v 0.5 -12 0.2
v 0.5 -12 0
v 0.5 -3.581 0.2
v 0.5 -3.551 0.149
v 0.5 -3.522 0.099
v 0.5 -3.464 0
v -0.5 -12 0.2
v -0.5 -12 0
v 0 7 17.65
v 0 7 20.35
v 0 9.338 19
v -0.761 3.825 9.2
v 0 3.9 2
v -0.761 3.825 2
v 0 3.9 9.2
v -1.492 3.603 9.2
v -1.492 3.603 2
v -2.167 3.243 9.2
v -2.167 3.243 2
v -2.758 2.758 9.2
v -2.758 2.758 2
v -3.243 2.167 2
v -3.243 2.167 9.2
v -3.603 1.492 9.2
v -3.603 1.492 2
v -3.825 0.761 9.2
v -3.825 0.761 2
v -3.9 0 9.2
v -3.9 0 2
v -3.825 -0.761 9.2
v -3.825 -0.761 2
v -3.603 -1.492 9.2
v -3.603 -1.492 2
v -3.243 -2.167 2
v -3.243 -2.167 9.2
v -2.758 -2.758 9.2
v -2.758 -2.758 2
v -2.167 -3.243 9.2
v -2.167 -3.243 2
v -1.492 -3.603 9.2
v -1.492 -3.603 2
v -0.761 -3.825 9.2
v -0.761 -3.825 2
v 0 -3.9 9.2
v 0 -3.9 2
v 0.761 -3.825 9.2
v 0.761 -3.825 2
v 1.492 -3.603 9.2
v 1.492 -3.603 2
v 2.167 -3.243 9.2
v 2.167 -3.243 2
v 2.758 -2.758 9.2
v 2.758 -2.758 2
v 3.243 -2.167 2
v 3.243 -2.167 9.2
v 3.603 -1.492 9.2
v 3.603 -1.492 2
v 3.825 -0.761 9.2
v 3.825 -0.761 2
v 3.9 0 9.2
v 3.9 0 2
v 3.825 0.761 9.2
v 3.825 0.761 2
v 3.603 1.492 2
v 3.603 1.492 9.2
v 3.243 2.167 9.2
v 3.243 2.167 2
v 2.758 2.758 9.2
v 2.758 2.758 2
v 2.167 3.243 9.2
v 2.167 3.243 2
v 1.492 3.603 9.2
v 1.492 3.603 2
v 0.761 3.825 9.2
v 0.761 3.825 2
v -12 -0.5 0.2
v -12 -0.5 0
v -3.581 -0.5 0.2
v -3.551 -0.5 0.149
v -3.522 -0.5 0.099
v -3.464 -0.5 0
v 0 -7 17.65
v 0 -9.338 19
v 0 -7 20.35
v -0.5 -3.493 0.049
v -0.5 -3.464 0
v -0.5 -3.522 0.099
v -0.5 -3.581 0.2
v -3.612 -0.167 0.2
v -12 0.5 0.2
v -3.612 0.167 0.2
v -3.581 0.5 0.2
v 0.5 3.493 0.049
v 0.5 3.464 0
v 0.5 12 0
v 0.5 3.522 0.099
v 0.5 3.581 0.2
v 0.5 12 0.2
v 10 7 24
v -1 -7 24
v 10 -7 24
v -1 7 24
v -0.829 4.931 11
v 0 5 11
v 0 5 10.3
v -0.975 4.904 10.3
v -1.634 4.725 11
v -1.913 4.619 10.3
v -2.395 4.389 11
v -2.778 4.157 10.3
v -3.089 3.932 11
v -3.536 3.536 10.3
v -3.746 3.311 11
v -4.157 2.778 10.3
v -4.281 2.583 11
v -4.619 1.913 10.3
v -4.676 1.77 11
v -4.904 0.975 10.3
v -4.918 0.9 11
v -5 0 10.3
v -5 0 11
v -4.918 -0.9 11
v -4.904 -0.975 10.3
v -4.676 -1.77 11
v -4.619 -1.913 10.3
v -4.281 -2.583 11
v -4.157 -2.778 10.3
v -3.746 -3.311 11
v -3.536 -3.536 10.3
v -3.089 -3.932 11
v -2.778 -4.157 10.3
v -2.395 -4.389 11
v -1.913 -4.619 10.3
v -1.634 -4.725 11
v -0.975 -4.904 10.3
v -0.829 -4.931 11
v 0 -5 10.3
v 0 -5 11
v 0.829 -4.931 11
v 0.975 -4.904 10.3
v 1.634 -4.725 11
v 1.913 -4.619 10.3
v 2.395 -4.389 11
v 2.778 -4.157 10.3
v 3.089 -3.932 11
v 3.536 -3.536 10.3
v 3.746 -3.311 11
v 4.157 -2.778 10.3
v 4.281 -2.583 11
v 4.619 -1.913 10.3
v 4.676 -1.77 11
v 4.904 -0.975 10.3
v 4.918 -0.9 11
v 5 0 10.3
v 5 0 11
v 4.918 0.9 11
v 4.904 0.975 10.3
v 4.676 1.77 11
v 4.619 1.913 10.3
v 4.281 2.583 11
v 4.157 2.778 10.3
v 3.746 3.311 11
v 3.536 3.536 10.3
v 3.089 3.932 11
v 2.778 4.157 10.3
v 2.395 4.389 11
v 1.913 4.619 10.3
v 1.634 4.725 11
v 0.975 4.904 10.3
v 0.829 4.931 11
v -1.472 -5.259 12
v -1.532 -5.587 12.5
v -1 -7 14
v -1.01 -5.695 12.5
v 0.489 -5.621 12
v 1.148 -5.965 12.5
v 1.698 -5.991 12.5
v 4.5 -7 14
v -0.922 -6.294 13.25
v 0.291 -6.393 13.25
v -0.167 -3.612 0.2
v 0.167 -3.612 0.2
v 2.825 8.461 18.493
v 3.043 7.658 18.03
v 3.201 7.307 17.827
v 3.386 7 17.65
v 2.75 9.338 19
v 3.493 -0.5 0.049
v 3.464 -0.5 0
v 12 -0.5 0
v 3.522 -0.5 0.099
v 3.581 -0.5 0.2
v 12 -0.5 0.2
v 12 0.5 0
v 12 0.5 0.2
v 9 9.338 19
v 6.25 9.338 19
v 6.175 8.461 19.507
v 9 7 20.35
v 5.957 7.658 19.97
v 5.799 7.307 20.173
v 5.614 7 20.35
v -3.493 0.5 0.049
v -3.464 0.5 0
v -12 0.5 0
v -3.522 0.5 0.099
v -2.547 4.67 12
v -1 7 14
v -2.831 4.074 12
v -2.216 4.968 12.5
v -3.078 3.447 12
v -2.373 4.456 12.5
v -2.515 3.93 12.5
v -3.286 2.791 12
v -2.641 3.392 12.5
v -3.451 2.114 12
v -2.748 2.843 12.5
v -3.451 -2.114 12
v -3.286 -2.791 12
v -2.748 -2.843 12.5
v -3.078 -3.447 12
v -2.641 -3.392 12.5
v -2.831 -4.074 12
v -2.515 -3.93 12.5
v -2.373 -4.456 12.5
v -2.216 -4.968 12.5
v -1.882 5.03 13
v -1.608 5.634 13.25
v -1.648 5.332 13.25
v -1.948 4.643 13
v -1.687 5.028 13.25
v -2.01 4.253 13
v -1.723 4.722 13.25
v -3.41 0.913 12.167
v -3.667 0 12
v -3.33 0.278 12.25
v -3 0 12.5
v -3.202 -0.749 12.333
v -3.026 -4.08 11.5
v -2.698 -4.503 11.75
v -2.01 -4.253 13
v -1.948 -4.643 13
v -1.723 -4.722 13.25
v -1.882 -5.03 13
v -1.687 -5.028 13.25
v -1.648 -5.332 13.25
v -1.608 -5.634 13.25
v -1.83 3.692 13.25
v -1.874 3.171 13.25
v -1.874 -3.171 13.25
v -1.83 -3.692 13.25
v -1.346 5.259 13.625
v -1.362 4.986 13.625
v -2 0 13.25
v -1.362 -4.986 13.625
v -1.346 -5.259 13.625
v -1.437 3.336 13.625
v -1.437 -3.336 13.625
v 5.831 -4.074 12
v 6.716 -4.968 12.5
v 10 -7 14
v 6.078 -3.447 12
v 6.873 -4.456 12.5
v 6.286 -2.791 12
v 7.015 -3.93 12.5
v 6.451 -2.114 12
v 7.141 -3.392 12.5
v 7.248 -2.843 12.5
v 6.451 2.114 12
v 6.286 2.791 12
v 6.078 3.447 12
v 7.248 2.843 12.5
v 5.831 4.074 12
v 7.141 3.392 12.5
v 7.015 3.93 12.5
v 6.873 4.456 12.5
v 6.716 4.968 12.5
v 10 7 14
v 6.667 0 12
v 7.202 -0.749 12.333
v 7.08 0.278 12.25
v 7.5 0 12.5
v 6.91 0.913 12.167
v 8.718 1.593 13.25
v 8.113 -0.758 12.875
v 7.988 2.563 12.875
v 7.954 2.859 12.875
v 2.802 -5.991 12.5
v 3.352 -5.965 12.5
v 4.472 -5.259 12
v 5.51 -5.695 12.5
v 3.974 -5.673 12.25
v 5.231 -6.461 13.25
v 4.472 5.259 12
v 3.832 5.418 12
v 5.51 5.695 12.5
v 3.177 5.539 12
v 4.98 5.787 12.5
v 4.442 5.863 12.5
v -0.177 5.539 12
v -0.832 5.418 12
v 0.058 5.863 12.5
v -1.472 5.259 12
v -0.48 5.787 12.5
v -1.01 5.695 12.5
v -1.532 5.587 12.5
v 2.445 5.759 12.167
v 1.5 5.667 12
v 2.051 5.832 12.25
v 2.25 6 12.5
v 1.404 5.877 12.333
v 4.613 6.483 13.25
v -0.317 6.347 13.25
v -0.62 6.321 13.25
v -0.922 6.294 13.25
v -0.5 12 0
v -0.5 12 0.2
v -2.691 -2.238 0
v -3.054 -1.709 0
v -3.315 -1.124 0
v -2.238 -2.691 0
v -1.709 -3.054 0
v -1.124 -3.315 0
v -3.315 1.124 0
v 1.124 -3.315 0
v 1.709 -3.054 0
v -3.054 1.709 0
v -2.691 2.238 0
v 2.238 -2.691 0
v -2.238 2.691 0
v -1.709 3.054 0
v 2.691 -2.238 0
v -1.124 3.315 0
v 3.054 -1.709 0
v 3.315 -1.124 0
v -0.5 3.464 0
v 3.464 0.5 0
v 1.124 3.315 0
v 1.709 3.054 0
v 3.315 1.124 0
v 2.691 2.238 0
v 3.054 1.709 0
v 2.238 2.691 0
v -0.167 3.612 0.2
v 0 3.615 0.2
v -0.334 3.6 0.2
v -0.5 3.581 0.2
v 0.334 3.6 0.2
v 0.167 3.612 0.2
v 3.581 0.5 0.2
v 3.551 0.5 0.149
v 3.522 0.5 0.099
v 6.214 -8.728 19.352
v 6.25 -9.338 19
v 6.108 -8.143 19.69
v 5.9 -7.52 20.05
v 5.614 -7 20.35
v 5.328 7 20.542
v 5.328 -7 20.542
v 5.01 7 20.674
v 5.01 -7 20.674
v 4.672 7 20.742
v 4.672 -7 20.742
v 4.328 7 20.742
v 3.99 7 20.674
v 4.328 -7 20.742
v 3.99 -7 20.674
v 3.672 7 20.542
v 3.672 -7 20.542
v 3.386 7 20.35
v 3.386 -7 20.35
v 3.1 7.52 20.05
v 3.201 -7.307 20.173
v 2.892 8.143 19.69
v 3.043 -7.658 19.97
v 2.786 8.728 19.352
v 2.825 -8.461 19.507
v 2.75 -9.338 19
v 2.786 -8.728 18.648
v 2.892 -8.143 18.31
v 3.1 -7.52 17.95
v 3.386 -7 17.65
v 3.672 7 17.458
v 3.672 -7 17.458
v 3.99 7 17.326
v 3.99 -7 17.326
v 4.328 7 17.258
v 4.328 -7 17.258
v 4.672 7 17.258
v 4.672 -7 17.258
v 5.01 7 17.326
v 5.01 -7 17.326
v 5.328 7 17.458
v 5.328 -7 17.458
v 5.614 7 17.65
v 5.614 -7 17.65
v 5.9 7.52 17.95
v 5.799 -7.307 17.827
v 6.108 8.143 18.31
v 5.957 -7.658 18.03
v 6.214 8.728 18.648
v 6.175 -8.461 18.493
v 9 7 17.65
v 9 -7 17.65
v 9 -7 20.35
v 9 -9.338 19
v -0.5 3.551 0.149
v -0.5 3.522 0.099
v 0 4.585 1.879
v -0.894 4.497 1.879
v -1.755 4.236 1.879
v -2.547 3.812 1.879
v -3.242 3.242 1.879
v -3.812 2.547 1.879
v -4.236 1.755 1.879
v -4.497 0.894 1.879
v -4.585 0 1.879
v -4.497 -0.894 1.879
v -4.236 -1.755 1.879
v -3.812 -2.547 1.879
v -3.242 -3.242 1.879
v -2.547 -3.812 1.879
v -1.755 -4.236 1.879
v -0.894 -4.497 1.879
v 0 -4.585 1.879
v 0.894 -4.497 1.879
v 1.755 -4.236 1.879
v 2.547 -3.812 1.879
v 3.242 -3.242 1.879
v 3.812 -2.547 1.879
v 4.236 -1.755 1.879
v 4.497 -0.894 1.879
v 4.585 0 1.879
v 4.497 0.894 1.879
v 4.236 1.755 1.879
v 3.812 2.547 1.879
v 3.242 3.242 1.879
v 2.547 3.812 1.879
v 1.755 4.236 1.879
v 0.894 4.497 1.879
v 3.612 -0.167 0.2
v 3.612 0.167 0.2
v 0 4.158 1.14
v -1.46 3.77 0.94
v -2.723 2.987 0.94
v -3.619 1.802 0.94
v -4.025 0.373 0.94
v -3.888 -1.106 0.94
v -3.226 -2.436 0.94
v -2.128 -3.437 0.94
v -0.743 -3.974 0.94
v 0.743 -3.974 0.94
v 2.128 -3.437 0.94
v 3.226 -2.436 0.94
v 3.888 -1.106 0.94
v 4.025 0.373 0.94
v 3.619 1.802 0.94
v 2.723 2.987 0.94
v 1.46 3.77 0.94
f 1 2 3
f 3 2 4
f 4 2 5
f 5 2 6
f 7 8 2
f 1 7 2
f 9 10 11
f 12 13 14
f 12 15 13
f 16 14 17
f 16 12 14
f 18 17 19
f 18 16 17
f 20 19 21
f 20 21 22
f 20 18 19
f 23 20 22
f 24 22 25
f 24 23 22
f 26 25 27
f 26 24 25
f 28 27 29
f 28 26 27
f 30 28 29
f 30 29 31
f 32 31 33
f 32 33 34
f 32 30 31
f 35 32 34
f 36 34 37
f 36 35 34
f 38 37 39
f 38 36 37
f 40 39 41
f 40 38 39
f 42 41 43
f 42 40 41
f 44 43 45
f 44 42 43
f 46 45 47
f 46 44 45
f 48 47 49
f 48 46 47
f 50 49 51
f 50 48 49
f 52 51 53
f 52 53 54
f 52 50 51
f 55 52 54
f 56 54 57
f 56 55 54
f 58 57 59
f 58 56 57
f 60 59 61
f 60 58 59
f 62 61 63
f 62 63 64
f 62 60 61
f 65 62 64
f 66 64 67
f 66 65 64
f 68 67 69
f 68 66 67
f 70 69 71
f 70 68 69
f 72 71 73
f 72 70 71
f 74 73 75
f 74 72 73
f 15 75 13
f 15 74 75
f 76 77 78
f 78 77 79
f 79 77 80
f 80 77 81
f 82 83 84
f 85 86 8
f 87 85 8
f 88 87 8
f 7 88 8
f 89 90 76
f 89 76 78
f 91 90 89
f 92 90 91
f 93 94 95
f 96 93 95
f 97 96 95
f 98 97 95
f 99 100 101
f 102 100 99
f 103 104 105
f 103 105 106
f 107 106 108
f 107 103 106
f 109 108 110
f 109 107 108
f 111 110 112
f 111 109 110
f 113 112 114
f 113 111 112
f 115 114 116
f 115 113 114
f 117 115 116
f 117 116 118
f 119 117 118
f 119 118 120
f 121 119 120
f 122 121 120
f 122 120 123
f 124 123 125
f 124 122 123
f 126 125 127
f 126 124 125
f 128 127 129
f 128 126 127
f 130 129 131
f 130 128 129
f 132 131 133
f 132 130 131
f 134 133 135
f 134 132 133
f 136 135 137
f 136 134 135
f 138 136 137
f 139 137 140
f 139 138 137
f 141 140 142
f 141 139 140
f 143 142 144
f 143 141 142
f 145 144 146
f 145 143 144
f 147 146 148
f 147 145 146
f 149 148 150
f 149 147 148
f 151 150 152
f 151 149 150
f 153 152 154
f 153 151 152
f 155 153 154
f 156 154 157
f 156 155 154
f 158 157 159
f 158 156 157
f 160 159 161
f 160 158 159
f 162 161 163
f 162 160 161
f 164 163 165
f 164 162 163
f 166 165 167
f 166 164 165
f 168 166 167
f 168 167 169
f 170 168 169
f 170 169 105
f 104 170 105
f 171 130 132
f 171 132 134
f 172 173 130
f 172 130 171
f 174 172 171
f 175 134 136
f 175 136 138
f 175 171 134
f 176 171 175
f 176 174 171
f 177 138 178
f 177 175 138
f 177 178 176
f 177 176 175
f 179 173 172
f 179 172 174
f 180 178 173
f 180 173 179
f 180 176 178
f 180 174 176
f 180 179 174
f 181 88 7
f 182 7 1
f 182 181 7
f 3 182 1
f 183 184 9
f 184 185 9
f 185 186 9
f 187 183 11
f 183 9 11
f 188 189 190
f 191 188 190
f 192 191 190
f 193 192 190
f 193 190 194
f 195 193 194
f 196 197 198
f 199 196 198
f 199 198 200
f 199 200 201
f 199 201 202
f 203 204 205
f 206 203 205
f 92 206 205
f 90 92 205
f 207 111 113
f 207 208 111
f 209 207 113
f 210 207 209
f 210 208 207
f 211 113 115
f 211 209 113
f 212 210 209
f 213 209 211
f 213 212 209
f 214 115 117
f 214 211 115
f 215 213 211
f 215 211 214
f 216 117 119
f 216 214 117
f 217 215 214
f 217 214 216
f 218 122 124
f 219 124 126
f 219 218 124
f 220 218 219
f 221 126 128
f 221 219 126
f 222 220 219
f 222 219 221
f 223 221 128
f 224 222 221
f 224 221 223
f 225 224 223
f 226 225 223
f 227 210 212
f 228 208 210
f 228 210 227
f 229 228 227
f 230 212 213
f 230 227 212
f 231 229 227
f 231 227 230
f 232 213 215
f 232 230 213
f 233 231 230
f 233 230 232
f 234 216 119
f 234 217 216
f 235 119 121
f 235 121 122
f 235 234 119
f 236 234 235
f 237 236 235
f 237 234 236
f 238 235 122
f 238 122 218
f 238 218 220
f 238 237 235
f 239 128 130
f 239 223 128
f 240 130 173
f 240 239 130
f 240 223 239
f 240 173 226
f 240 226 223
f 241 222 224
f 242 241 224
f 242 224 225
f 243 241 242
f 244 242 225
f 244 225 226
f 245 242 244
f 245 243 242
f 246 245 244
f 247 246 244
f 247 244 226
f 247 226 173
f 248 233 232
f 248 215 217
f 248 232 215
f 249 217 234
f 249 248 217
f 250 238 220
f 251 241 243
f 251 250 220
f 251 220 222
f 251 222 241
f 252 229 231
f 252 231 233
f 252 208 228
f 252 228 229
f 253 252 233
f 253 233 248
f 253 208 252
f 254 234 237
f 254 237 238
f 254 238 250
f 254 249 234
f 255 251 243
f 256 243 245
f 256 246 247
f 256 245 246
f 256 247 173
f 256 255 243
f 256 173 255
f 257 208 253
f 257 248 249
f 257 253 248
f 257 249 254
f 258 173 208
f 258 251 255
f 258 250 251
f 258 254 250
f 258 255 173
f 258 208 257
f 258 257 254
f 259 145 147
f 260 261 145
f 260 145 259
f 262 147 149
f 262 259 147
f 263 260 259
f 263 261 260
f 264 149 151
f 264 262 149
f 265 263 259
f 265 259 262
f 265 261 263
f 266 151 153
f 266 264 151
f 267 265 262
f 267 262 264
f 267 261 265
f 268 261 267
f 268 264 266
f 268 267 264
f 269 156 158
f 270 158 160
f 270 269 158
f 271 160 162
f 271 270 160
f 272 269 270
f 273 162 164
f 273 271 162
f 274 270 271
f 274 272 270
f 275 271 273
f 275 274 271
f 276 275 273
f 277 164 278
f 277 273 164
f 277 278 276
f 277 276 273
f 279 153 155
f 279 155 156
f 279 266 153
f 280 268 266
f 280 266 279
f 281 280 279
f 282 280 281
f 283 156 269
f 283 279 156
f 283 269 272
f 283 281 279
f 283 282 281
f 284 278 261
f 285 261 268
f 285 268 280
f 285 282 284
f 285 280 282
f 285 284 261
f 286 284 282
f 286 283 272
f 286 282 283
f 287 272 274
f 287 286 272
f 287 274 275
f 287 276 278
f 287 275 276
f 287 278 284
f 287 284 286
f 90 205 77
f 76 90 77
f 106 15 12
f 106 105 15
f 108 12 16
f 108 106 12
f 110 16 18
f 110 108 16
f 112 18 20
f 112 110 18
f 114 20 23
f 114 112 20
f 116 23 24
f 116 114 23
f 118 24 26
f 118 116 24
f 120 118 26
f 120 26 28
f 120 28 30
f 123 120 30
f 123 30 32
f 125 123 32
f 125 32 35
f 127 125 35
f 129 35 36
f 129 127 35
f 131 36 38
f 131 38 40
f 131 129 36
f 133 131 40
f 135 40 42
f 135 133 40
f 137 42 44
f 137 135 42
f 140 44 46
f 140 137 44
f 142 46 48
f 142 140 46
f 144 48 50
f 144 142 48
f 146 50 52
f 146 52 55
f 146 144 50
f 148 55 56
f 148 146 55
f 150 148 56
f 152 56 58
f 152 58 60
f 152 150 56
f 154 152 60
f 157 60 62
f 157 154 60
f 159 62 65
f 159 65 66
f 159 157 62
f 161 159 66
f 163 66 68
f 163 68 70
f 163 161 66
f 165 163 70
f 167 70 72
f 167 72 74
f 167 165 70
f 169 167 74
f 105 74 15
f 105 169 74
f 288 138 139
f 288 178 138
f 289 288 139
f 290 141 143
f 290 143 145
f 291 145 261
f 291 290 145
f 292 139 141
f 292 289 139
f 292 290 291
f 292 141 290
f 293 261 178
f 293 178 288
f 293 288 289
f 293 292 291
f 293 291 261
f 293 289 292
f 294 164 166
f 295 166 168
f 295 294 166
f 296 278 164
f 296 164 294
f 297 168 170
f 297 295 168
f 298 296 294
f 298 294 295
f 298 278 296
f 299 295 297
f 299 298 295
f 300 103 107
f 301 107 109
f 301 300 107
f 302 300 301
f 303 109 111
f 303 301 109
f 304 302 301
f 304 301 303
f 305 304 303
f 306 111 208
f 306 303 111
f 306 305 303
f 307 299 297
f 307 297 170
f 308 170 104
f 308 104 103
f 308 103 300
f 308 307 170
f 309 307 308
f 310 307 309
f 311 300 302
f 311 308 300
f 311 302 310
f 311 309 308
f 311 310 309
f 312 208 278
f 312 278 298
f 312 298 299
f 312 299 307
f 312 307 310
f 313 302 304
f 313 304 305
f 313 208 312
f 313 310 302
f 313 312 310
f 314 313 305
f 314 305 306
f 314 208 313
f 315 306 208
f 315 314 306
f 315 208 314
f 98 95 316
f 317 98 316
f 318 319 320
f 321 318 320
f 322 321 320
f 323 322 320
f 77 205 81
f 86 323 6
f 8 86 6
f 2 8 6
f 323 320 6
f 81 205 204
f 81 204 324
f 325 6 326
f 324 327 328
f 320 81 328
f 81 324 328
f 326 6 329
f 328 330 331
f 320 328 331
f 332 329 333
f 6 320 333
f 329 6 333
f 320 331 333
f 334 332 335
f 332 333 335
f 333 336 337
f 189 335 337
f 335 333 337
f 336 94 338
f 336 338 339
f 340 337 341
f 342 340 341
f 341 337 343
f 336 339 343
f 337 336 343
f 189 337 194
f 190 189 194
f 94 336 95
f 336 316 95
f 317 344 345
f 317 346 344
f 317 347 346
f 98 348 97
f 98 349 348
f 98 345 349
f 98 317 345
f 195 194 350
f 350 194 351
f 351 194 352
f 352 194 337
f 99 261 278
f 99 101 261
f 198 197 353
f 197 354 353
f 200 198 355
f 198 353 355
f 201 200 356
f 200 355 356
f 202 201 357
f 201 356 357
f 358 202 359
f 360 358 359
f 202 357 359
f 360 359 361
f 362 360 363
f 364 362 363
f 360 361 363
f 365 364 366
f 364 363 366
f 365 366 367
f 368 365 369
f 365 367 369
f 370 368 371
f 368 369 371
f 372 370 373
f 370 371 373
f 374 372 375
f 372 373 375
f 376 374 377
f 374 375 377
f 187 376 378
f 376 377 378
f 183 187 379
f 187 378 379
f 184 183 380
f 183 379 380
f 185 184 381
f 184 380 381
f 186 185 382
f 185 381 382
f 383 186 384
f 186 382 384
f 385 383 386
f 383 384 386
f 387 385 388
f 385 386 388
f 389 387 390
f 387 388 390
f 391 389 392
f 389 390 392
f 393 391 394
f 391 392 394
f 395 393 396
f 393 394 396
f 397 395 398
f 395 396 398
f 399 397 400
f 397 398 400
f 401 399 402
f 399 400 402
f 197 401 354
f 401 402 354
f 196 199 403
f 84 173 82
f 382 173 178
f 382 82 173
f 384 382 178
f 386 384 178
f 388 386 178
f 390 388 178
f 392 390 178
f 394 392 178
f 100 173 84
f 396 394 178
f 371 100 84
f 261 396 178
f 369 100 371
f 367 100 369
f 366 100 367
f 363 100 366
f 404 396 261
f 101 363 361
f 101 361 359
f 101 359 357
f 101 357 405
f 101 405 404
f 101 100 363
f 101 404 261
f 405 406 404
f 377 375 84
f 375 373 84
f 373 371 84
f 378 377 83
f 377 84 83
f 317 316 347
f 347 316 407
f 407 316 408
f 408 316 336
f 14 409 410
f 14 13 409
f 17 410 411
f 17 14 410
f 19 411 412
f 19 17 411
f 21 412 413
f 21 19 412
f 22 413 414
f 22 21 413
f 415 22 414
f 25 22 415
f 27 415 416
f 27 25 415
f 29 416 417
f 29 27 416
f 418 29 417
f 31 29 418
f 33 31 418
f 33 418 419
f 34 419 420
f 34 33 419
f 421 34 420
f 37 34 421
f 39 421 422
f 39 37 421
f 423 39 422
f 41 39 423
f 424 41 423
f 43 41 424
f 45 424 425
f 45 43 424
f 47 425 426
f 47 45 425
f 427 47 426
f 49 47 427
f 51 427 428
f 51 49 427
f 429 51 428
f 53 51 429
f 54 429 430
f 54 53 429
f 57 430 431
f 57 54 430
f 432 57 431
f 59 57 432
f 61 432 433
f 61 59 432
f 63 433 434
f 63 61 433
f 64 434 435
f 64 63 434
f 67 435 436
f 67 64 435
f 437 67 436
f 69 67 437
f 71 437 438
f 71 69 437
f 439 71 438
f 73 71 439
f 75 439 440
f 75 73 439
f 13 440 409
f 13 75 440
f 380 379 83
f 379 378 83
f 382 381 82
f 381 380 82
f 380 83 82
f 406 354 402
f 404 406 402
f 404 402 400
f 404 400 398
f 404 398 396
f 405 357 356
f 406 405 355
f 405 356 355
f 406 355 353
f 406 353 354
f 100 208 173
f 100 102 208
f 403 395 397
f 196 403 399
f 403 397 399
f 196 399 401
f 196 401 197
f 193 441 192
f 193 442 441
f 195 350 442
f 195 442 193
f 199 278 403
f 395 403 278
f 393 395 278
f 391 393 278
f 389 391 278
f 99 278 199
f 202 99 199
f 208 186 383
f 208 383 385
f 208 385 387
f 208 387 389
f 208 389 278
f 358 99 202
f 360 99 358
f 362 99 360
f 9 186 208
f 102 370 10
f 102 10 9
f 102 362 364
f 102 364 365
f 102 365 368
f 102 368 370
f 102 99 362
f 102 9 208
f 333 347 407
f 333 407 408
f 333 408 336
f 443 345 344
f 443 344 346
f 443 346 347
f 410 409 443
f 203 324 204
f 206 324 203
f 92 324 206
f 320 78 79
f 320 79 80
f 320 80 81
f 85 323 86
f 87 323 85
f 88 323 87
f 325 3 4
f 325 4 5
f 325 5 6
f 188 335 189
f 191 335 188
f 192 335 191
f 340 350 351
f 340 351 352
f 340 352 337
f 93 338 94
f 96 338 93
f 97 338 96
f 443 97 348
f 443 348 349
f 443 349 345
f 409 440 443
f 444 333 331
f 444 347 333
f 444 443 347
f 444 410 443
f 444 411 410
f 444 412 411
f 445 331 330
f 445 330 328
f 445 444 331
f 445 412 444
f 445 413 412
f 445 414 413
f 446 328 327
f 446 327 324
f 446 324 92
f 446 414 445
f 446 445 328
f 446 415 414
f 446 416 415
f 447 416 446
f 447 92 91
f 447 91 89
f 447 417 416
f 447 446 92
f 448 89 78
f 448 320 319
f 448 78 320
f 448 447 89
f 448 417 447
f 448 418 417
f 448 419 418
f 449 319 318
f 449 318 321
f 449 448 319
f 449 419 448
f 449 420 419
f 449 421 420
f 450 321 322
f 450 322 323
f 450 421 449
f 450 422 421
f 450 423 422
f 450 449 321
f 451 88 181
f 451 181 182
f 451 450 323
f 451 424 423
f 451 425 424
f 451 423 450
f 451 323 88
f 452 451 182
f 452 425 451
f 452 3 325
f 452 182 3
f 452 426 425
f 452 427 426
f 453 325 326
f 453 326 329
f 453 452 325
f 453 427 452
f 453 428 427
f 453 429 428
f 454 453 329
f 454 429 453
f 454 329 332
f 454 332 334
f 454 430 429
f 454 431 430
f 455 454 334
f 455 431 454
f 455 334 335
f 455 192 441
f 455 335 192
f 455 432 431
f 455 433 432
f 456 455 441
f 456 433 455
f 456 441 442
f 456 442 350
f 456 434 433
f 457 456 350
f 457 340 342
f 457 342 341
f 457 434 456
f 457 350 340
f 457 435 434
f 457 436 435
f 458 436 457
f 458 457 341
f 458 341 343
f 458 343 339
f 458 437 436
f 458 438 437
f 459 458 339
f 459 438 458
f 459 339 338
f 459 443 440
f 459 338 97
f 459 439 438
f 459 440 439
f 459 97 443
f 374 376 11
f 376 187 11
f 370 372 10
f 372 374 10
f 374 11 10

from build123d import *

# Parameters (mm, degrees)
SKETCH002_R       = 5
SKETCH003_W       = 14
SKETCH003_H       = 11
SKETCH004_W       = 14
SKETCH004_H       = 11
PAD_DEPTH         = 9
SKETCH006_R       = 1.75
POCKET_DEPTH      = 9.339269
POCKET_DEPTH_BACK = 9.339269
PAD001_DEPTH      = 0.2


with BuildPart() as part:
    # Sketch001 → Revolution001 (revolve)
    with BuildSketch(Plane.YZ):
        Polygon((0, 0), (3.5, 0), (4.584969, 1.879221), (3.9, 2), (3.9, 9.2), (5, 10.3), (5, 11), (0, 11), align=None)
    revolve(axis=Axis((0, 0, 0), (0, 0, 1)))

    # Sketch002 (on DatumPlane) → AdditiveLoft section 0
    with BuildSketch(Plane(origin=(0, 0, 11), x_dir=(0, -1, 0), z_dir=(0, 0, 1))):
        Circle(SKETCH002_R)
    # Sketch003 (on DatumPlane) → AdditiveLoft section 1
    with BuildSketch(Plane(origin=(0, 0, 14), x_dir=(0, -1, 0), z_dir=(0, 0, 1))):
        with Locations((0, 4.5)):
            Rectangle(SKETCH003_W, SKETCH003_H)
    # Sketch004 (on DatumPlane) → AdditiveLoft section 2
    with BuildSketch(Plane(origin=(0, 0, 24), x_dir=(0, -1, 0), z_dir=(0, 0, 1))):
        with Locations((0, 4.5)):
            Rectangle(SKETCH004_W, SKETCH004_H)
    loft(ruled=True)

    # Sketch005 → Pad (new body)
    with BuildSketch(Plane.YZ):
        Polygon((-7, 20.35), (-9.338269, 19), (-7, 17.65), (7, 17.65), (9.338269, 19), (7, 20.35), align=None)
    extrude(amount=PAD_DEPTH)

    # Sketch006 → Pocket (cut, two sides)
    with BuildSketch(Plane.XZ) as pocket_sk:
        with Locations((4.5, 19)):
            Circle(SKETCH006_R)
    extrude(amount=-POCKET_DEPTH, mode=Mode.SUBTRACT)
    extrude(pocket_sk.sketch, amount=POCKET_DEPTH_BACK, mode=Mode.SUBTRACT)

    # Sketch007 → Pad001 (join)
    with BuildSketch(Plane.XY):
        Polygon((12, 0.5), (3, 0.5), (0.5, 3), (0.5, 12), (-0.5, 12), (-0.5, 3), (-3, 0.5), (-12, 0.5), (-12, -0.5), (-3, -0.5), (-0.5, -3), (-0.5, -12), (0.5, -12), (0.5, -3), (3, -0.5), (12, -0.5), align=None)
    extrude(amount=PAD001_DEPTH)


solid = part.part
